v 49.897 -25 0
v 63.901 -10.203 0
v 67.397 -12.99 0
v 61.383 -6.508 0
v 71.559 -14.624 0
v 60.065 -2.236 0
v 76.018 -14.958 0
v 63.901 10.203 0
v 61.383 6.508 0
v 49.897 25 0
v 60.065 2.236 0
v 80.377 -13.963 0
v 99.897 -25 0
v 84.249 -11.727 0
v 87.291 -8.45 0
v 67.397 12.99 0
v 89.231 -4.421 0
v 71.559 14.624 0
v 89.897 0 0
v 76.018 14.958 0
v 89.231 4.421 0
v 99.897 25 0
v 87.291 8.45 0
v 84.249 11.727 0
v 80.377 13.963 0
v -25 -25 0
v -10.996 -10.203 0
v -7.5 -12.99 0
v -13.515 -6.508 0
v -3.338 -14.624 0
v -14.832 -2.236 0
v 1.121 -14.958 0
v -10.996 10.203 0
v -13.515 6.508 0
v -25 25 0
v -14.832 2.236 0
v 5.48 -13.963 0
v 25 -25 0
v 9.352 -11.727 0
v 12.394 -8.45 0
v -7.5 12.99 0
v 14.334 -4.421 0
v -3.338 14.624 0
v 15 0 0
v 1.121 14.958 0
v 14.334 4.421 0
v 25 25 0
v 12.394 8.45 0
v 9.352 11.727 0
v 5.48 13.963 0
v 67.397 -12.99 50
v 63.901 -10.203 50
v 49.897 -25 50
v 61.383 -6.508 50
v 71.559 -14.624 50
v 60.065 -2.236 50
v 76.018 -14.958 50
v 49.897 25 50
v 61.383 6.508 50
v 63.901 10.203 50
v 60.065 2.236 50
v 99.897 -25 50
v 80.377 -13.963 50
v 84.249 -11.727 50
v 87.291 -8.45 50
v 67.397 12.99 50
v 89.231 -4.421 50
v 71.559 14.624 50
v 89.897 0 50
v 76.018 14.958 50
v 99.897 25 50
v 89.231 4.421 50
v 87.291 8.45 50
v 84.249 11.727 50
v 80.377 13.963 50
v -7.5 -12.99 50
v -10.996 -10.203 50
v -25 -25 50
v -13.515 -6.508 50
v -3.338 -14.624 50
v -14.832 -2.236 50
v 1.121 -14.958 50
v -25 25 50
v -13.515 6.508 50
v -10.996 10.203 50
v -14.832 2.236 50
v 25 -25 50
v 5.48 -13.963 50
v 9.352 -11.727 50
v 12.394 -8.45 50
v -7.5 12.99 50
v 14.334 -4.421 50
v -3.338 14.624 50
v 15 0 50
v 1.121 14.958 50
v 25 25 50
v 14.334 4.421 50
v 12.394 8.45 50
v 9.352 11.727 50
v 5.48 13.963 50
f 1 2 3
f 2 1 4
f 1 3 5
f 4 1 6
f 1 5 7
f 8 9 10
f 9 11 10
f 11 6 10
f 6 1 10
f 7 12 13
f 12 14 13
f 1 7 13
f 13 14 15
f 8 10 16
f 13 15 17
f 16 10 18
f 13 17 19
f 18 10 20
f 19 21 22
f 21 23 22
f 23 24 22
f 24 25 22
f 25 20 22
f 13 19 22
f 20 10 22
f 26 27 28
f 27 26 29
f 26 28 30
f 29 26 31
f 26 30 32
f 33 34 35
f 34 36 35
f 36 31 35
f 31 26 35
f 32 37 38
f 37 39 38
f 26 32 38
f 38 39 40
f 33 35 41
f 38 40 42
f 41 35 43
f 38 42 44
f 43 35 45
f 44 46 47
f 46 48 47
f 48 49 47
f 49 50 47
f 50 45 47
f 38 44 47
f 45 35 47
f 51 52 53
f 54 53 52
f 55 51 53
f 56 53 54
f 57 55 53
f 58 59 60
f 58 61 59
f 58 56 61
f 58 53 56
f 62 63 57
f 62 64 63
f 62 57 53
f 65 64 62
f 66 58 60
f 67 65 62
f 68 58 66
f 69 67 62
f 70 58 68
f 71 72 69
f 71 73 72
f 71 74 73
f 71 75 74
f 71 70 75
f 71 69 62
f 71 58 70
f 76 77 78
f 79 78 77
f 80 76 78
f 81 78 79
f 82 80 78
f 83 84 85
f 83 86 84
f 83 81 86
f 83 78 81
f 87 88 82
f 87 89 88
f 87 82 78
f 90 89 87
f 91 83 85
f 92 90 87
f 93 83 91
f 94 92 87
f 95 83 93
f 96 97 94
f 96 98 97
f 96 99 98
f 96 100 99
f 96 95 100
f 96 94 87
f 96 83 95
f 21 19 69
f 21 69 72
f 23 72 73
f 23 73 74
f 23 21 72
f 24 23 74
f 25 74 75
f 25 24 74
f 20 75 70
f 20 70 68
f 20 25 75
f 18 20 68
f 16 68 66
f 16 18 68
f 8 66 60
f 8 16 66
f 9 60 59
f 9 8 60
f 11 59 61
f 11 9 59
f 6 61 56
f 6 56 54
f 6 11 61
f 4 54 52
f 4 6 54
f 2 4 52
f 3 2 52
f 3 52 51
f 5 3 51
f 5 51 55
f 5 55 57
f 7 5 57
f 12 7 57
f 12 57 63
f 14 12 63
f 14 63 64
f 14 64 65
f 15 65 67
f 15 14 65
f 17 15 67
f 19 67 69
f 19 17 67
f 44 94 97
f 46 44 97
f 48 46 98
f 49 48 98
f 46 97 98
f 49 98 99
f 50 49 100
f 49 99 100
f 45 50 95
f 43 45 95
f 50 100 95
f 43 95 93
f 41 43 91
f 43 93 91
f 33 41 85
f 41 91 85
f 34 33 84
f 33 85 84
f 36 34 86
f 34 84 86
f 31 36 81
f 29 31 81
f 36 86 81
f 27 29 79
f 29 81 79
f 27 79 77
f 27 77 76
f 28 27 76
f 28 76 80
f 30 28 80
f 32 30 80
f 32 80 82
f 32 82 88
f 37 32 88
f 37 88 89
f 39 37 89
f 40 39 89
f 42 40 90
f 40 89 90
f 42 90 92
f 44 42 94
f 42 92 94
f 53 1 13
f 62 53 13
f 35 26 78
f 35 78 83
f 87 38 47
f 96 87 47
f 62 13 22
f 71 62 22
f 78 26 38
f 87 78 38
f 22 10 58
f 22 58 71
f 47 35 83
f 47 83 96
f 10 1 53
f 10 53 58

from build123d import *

# Parameters (mm, degrees)
F0_W     = 50
F0_H     = 50
F1_DEPTH = 50
F2_R     = 15
F3_DEPTH = 50
F4_W     = 50
F4_H     = 50
F4_R     = 15
F5_DEPTH = 50
F6_DEPTH = 50


with BuildPart() as f1:
    # F0 (on Top) → F1 (new body)
    with BuildSketch(Plane.XY):
        Rectangle(F0_W, F0_H)
    extrude(amount=F1_DEPTH)

    # F2 (on face) → F3 (cut)
    with BuildSketch(Plane.XY.offset(50)):
        Circle(F2_R)
    extrude(amount=-F3_DEPTH, mode=Mode.SUBTRACT)


with BuildPart() as f5:
    # F4 (on Top) → F5 (new body)
    with BuildSketch(Plane.XY):
        with Locations((74.897081, 0)):
            Rectangle(F4_W, F4_H)
        with Locations((74.897081, 0)):
            Circle(F4_R, mode=Mode.SUBTRACT)
    extrude(amount=F5_DEPTH)

    # F4 (on Top) → F6 (join)
    with BuildSketch(Plane.XY):
        with Locations((74.897081, 0)):
            Rectangle(F4_W, F4_H)
        with Locations((74.897081, 0)):
            Circle(F4_R, mode=Mode.SUBTRACT)
    extrude(amount=F6_DEPTH)


solid = Compound([f1.part, f5.part])
